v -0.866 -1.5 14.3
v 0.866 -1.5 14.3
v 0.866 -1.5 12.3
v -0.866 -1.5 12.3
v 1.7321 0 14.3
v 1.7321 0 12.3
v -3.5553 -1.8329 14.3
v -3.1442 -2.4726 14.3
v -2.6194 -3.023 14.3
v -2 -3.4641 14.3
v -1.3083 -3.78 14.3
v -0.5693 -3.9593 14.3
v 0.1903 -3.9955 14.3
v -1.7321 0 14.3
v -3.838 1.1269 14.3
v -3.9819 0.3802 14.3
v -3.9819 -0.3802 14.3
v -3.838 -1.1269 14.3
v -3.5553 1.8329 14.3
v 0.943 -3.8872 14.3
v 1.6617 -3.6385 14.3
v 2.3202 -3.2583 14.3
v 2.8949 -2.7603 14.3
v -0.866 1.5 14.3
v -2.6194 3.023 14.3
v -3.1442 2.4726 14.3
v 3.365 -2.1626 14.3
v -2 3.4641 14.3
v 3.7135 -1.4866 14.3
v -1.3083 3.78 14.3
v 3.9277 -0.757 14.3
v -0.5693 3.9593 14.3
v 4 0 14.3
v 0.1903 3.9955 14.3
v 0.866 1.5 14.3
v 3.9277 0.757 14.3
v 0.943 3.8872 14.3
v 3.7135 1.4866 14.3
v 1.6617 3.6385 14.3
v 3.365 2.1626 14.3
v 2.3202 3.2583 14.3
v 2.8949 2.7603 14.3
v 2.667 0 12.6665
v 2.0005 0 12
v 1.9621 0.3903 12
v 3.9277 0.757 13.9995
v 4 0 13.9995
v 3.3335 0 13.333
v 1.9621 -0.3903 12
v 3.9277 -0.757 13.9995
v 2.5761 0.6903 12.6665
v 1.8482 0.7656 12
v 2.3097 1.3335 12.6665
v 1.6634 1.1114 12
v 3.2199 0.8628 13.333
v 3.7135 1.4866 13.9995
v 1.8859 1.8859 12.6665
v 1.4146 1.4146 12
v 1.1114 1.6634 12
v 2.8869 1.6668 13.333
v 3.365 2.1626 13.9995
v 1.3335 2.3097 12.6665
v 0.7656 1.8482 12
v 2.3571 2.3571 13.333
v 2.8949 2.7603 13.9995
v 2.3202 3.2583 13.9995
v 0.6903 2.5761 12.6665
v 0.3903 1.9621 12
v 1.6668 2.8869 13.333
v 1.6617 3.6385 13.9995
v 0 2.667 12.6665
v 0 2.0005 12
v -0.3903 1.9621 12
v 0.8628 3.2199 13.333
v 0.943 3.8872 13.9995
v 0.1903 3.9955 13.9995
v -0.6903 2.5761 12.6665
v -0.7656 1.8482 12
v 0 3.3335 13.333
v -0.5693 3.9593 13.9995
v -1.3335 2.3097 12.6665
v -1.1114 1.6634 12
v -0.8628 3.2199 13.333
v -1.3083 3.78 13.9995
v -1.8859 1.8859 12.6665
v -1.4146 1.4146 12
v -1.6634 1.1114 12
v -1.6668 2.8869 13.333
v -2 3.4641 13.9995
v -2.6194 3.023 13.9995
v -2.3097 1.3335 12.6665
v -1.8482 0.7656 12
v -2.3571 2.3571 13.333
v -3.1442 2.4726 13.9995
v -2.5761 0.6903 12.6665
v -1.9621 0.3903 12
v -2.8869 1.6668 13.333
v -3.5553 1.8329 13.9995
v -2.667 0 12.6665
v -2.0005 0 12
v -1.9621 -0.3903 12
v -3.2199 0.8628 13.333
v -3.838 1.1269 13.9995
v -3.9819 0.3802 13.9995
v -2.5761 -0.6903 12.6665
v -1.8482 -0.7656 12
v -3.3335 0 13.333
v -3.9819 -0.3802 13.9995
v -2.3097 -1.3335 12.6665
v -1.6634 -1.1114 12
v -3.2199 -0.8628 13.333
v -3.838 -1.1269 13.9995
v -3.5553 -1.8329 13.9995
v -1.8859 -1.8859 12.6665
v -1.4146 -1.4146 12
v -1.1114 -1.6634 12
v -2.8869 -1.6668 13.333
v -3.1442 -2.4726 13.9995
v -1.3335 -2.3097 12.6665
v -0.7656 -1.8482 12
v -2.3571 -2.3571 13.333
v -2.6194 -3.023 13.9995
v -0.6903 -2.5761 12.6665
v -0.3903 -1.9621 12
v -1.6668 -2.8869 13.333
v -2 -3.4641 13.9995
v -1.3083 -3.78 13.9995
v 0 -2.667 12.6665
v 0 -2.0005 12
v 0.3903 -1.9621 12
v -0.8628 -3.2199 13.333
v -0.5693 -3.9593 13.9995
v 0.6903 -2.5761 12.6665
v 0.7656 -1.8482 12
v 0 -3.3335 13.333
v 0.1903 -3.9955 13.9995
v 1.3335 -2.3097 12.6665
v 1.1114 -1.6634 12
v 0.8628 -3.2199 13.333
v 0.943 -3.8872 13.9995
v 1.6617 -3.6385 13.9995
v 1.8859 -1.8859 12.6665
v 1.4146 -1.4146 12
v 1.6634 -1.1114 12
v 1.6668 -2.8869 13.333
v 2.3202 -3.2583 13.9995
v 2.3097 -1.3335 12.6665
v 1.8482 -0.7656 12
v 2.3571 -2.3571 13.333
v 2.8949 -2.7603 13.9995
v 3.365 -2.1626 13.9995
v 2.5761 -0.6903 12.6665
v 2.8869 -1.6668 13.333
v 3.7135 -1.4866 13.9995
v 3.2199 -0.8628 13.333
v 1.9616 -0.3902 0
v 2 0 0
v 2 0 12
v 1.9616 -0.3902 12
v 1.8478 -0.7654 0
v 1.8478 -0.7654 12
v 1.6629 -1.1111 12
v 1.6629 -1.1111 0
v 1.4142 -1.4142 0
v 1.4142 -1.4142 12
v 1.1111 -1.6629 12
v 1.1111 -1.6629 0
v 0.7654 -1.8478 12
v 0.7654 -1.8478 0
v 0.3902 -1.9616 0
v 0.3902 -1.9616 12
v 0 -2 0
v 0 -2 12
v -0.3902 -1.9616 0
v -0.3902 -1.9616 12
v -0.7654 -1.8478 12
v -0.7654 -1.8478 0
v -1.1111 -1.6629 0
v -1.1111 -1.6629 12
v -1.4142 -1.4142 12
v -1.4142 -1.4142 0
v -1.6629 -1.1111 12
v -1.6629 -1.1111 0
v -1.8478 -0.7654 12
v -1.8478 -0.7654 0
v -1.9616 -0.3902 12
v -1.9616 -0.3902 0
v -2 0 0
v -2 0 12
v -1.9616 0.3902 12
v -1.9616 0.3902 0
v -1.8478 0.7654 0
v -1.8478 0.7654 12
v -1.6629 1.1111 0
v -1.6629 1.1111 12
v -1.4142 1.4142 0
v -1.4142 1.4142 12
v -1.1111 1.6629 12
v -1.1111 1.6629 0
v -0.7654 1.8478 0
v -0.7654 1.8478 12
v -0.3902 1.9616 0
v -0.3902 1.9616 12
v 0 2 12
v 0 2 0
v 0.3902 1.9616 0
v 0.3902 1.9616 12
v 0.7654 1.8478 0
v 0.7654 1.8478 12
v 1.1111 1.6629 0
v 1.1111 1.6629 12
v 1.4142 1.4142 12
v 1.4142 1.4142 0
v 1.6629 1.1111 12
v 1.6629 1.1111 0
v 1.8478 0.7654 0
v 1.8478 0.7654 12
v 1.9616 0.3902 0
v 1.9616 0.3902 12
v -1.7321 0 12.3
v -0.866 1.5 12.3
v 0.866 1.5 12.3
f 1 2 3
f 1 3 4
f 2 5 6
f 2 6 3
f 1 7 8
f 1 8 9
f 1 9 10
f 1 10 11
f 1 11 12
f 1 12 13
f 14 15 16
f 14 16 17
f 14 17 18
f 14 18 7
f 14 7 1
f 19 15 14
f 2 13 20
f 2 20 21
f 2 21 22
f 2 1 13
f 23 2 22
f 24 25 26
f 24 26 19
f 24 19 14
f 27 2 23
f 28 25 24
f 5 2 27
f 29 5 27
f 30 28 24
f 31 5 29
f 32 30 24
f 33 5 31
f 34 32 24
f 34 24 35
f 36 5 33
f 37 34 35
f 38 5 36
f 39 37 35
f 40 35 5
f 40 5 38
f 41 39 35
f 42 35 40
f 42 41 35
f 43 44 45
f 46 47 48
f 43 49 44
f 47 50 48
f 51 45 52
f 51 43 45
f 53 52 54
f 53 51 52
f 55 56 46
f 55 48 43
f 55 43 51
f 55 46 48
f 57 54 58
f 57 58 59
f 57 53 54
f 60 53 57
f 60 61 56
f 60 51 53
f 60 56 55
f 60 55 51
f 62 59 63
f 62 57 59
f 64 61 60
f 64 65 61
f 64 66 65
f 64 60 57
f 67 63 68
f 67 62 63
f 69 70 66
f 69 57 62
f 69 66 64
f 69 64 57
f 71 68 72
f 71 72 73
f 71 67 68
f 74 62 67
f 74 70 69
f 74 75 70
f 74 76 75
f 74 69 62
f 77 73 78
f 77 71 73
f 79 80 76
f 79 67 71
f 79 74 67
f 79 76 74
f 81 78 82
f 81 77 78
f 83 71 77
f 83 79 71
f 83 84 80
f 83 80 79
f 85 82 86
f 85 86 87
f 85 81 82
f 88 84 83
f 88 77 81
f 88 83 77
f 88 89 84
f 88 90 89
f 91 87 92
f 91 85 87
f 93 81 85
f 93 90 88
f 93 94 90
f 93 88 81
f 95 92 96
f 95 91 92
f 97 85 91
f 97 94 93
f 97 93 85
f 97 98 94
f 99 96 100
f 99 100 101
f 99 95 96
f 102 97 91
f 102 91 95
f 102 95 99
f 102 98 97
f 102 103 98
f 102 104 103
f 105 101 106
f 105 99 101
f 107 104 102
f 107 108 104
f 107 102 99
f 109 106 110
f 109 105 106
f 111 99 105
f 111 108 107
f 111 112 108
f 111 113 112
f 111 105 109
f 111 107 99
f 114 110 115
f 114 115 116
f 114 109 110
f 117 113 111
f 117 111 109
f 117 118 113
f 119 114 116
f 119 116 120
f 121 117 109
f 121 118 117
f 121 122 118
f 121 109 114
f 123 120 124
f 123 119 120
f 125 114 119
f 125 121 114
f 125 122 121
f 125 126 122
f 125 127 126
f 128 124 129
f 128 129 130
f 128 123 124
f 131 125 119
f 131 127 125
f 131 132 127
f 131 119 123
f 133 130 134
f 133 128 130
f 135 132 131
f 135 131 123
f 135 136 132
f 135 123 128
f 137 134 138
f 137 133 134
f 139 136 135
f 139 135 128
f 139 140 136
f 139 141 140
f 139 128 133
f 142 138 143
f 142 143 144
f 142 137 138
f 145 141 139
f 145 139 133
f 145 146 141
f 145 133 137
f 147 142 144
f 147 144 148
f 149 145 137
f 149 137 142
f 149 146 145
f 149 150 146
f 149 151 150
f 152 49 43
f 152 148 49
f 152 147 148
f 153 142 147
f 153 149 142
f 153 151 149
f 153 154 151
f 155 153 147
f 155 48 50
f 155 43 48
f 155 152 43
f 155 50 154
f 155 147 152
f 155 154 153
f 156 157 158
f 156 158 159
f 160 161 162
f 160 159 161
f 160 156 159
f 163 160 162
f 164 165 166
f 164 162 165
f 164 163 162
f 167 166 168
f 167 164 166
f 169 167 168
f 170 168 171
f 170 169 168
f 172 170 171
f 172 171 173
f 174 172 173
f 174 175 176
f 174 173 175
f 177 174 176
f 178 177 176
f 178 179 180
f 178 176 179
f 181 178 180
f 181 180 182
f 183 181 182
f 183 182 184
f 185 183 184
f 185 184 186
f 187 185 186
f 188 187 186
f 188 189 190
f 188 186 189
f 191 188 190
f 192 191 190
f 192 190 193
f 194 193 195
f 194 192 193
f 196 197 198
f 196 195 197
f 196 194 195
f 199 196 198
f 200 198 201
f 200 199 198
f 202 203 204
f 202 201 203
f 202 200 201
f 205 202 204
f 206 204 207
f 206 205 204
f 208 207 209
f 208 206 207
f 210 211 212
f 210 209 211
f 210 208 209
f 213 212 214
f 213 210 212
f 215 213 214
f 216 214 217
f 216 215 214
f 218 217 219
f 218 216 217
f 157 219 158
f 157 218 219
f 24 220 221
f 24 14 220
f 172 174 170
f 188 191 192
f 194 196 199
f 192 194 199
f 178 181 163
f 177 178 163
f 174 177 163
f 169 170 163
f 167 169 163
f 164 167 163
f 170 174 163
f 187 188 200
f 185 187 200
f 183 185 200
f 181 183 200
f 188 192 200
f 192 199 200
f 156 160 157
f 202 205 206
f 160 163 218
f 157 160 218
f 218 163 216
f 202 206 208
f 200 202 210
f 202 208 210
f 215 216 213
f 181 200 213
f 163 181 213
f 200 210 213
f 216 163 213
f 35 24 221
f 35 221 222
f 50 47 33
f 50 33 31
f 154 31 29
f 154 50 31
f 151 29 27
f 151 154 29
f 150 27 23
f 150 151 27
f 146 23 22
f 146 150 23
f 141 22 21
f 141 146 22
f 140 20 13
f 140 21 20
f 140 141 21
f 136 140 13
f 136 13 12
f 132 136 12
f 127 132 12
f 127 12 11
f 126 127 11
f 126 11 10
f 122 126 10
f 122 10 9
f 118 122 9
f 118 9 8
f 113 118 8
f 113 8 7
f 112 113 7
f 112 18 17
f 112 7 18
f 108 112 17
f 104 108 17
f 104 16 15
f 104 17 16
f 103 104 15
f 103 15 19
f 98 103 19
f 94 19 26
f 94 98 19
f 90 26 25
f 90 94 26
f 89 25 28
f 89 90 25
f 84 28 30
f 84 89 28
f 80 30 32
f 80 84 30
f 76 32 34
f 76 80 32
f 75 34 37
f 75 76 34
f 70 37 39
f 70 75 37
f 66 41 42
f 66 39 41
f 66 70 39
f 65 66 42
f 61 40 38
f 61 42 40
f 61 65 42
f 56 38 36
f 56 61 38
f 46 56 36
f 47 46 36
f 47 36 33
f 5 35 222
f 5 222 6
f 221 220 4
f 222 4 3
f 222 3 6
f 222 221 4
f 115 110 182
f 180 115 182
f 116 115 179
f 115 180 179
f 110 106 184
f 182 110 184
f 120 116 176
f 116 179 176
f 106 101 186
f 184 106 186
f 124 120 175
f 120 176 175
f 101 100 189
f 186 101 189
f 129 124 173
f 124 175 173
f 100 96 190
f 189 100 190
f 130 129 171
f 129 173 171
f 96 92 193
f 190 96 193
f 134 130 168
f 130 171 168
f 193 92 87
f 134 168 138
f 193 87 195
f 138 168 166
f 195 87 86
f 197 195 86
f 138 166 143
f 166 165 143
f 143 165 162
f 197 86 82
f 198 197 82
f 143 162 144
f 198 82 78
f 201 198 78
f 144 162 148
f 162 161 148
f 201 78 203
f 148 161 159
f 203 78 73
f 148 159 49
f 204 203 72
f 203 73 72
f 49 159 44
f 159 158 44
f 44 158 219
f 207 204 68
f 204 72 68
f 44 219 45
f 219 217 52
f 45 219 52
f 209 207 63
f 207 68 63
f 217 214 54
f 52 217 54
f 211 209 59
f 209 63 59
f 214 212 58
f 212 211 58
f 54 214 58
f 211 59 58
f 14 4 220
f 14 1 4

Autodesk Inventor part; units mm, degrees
ref_plane "YZ Plane" through (0, 0, 0) normal (1, 0, 0) x (0, 1, 0)
ref_plane "XZ Plane" through (0, 0, 0) normal (0, 1, 0) x (-1, 0, 0)
ref_plane "XY Plane" through (0, 0, 0) normal (0, 0, 1) x (1, 0, 0)
sketch "スケッチ1" plane through (0, 0, 0) normal (0, 0, 1) x (1, 0, 0)
  circle A0 centre (0, 0) radius 2
  dimension "d0" = 4
extrude "押し出し1" add sketch "スケッチ1" along normal blind 12
sketch "スケッチ2" plane through (0, 0, 12) normal (0, 0, 1) x (1, 0, 0)
  circle A0 centre (0, 0) radius 4
  dimension "d3" = 8
extrude "押し出し2" add sketch "スケッチ2" along normal blind 2.3
chamfer "面取り1" distance 2 angle 45 1 edges at (-4, 0, 12)
sketch "スケッチ3" plane through (0, 0, 14.3) normal (0, 0, 1) x (1, 0, 0)
  line L0 (1.7321, 0) -> (0.866, -1.5)
  line L1 (0.866, -1.5) -> (-0.866, -1.5)
  line L2 (-0.866, -1.5) -> (-1.7321, 0)
  line L3 (-1.7321, 0) -> (-0.866, 1.5)
  line L4 (-0.866, 1.5) -> (0.866, 1.5)
  line L5 (0.866, 1.5) -> (1.7321, 0)
  point P0 (0, 0)
  point P1 (0, 0)
  dimension "d9" = 3
extrude "押し出し3" cut sketch "スケッチ3" against normal blind 2
thread "ねじ1" size "M4x0.7" class "6g" standard "ANSI Metric M Profile" full length
properties part number "M4皿ネジ　12" material "鉄 灰色"
